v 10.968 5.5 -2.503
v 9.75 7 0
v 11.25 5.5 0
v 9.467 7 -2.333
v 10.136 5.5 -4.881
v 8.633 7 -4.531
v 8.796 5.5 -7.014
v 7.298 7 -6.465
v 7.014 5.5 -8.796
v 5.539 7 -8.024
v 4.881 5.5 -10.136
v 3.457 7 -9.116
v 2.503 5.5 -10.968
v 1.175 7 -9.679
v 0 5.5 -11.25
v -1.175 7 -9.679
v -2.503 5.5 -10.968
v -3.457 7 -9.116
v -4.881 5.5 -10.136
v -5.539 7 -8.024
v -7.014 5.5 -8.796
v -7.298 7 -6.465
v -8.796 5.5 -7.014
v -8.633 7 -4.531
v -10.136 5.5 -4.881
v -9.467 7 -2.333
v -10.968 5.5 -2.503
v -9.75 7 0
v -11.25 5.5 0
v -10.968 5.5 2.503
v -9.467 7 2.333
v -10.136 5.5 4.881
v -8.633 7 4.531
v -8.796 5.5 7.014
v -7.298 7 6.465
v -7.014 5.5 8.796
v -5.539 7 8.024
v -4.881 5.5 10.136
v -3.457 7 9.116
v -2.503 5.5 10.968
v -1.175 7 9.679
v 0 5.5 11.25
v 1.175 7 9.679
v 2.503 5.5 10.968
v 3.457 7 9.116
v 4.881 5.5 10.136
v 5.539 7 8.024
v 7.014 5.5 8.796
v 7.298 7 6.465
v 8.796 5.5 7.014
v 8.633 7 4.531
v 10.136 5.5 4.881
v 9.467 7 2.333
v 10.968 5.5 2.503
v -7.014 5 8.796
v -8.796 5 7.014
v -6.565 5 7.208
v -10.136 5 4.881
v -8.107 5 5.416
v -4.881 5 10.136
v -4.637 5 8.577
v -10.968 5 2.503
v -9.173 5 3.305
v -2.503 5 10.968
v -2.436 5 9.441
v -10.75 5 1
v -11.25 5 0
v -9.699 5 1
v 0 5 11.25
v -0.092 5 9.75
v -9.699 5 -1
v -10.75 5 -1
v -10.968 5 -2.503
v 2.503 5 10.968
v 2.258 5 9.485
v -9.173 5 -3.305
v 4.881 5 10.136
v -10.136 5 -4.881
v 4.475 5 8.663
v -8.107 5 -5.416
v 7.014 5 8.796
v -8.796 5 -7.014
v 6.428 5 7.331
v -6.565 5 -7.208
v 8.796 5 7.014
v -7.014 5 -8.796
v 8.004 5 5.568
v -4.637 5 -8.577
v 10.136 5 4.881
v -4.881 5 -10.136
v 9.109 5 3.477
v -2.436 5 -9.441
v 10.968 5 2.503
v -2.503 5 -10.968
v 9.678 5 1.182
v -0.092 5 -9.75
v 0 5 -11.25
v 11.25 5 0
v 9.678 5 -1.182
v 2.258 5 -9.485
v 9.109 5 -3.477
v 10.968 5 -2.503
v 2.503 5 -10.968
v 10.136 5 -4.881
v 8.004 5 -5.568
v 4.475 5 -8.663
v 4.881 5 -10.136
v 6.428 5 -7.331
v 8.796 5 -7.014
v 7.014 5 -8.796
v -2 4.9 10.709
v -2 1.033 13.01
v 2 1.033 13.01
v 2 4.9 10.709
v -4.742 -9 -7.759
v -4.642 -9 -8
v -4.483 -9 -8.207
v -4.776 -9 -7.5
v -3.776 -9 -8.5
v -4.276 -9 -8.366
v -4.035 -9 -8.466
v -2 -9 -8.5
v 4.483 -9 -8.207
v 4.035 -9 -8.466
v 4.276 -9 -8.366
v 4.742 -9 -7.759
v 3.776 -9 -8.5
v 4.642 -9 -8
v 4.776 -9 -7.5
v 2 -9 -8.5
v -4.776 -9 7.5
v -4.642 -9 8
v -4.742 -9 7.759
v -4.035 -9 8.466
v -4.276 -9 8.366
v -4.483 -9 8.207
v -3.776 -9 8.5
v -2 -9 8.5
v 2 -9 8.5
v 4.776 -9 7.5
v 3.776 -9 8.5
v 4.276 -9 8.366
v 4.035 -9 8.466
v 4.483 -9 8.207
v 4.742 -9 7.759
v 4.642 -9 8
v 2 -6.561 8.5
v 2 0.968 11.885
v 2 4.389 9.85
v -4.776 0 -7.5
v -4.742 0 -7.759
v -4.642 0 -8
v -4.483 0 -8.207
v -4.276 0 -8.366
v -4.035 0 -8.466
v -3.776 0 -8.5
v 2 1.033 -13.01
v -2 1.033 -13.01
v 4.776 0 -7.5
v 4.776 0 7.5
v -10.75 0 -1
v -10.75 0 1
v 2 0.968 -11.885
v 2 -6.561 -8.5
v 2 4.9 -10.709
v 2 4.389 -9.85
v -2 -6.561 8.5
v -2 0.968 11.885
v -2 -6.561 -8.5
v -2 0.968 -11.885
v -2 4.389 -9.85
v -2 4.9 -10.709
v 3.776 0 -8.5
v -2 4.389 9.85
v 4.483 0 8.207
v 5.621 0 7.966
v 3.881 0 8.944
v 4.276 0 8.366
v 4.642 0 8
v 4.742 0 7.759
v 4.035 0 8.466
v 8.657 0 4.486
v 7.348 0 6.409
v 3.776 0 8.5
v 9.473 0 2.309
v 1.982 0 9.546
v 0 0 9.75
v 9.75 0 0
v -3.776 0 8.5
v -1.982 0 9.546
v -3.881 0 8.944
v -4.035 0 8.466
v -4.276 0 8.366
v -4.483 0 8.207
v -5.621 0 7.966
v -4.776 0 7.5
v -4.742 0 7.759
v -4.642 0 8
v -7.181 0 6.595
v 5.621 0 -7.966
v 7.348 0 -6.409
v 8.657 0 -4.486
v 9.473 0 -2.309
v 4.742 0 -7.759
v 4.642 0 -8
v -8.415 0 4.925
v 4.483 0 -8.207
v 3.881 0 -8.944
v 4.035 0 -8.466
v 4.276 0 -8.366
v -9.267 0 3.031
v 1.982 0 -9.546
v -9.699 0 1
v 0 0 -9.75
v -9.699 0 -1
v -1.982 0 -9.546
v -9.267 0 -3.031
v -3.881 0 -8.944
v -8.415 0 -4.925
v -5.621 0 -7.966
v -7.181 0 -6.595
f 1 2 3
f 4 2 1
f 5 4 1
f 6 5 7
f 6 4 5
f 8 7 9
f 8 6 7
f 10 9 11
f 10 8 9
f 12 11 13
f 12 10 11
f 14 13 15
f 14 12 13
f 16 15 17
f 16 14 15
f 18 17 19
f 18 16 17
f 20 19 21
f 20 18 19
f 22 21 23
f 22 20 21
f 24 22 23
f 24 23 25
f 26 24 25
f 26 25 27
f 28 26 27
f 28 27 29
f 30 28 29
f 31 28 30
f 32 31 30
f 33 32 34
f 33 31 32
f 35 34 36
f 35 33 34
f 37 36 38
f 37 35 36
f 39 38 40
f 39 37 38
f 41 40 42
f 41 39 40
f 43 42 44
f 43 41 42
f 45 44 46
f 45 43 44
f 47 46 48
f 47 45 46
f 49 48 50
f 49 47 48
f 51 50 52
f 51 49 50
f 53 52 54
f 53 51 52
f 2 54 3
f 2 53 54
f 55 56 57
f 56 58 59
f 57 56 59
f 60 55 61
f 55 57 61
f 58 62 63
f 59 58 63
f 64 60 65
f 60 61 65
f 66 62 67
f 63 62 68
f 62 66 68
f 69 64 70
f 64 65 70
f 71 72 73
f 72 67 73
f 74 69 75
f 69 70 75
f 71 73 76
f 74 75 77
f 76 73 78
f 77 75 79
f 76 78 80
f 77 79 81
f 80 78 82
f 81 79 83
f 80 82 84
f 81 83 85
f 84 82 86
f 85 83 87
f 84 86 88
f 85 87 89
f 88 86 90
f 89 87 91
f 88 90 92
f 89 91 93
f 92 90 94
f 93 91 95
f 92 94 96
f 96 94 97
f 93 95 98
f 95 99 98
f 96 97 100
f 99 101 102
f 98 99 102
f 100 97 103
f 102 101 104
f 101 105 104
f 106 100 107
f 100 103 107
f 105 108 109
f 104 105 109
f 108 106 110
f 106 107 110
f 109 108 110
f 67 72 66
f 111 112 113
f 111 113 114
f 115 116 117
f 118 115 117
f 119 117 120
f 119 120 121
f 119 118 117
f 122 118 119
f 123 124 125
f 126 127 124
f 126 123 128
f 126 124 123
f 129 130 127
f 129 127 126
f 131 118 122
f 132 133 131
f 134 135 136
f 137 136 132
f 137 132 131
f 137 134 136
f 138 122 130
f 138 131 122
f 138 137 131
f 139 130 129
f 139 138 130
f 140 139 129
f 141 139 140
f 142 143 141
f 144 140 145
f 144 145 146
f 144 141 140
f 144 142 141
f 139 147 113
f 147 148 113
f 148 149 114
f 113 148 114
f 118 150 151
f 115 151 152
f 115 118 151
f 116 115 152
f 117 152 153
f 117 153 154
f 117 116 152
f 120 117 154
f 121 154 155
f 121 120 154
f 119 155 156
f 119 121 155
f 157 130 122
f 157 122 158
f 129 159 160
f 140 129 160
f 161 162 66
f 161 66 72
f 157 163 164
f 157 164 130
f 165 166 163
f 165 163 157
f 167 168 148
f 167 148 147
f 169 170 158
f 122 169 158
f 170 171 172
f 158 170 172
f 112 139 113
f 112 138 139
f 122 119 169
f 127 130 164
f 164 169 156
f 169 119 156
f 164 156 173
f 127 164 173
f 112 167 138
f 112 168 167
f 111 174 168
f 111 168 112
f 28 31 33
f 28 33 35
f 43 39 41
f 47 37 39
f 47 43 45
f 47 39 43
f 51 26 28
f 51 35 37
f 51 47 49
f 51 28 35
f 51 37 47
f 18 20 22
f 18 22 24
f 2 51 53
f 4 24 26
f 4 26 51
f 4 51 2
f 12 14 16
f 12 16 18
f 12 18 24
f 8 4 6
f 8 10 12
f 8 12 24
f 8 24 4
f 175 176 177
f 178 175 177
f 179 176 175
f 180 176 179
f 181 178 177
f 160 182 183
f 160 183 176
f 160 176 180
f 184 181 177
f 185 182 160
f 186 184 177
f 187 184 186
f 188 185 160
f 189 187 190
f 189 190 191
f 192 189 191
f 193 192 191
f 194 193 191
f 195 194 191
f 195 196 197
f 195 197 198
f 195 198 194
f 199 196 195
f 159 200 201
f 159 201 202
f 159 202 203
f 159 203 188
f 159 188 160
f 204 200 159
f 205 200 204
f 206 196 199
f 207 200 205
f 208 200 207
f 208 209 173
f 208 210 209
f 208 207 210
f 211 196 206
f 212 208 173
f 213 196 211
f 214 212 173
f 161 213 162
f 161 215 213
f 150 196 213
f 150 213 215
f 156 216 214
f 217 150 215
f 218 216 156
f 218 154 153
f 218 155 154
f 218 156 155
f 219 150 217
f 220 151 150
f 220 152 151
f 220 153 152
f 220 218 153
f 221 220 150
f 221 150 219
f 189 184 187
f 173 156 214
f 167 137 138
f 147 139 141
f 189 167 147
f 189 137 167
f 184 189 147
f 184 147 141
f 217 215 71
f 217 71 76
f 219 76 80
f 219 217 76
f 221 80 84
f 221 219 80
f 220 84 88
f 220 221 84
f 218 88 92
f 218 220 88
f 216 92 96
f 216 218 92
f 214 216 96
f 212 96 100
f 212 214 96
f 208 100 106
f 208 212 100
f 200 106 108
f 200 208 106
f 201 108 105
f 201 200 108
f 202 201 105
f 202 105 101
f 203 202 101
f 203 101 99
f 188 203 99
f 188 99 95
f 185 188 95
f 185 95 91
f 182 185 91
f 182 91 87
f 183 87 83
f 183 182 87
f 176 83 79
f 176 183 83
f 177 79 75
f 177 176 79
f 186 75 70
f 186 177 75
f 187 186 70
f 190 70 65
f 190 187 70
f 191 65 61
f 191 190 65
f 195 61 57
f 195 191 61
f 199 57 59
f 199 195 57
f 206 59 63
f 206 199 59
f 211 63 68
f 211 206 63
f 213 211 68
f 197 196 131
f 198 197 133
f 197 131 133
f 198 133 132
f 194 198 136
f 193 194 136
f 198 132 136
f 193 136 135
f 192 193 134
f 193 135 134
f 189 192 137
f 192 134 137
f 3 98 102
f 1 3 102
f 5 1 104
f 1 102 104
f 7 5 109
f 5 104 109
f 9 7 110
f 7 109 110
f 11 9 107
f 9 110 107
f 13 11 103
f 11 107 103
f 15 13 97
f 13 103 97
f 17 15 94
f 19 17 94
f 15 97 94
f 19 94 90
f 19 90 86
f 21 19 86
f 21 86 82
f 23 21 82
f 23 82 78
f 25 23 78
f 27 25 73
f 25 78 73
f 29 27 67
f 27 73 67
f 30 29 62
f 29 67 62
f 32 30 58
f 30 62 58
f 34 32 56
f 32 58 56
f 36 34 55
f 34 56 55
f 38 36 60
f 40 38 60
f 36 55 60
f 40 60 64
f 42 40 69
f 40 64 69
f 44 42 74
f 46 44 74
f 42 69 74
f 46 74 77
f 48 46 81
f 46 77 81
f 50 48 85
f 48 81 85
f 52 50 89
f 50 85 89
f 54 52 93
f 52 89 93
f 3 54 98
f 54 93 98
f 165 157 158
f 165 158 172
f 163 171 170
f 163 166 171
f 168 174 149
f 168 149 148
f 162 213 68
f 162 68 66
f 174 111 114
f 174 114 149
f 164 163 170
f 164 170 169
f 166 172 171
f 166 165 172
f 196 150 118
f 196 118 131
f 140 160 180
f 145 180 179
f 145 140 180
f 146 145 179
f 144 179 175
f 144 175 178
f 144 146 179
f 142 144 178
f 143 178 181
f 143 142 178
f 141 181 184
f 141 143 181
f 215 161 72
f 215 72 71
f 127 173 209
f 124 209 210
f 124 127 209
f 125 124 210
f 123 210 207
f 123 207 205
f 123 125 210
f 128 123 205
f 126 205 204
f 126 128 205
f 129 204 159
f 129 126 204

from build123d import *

# Parameters (mm, degrees)
EXTRUDE_1_DEPTH = 5
SKETCH_2_R      = 11.25
EXTRUDE_2_DEPTH = 2
CHAMFER_1_SIZE  = 1.5
SKETCH_3_W      = 9.552486588
SKETCH_3_H      = 17
EXTRUDE_3_DEPTH = 9
FILLET_1_R      = 1
EXTRUDE_4_DEPTH = 2


with BuildPart() as part:
    # Эскиз1 → Бобышка-Вытянуть1 (new body)
    with BuildSketch(Plane(origin=(0, 0, 0), x_dir=(1, 0, 0), z_dir=(0, 1, 0))):
        with BuildLine():
            Line((-10.75, 1), (-9.698582371, 1))
            ThreePointArc((-9.698582371, 1), (9.75, 0), (-9.698582371, -1))
            Line((-9.698582371, -1), (-10.75, -1))
            Line((-10.75, -1), (-10.75, 1))
        make_face()
    extrude(amount=EXTRUDE_1_DEPTH)

    # Эскиз2 → Бобышка-Вытянуть2 (add)
    with BuildSketch(Plane(origin=(0, 5, 0), x_dir=(1, 0, 0), z_dir=(0, 1, 0))):
        Circle(SKETCH_2_R)
    extrude(amount=EXTRUDE_2_DEPTH)

    # Фаска1
    chamfer_1_edges = [part.edges().sort_by_distance(p)[0] for p in [
        (-11.25, 7, 0),
    ]]
    chamfer(chamfer_1_edges, length=CHAMFER_1_SIZE)

    # Эскиз3 → Бобышка-Вытянуть3 (add)
    with BuildSketch(Plane.XZ):
        Rectangle(SKETCH_3_W, SKETCH_3_H)
    extrude(amount=EXTRUDE_3_DEPTH)

    # Скругление1
    fillet_1_edges = [part.edges().sort_by_distance(p)[0] for p in [
        (-4.776243294, -4.5, 8.5),
        (-4.776243294, -4.5, -8.5),
        (4.776243294, -4.5, -8.5),
        (4.776243294, -4.5, 8.5),
    ]]
    fillet(fillet_1_edges, radius=FILLET_1_R)

    # Эскиз4 → Бобышка-Вытянуть4 (add, symmetric)
    with BuildSketch(Plane(origin=(0, 0, 0), x_dir=(0, 0, -1), z_dir=(1, 0, 0))):
        Polygon((-8.5, -9), (-13.010373574, 1.032772808), (-10.70938382, 4.9), (-9.85, 4.388668944), (-11.885037306, 0.968422681), (-7.587929745, -8.589966039), align=None)
        Polygon((11.885037306, 0.968422681), (7.587929745, -8.589966039), (8.5, -9), (13.010373574, 1.032772808), (10.70938382, 4.9), (9.85, 4.388668944), align=None)
    extrude(amount=EXTRUDE_4_DEPTH, both=True)


solid = part.part
